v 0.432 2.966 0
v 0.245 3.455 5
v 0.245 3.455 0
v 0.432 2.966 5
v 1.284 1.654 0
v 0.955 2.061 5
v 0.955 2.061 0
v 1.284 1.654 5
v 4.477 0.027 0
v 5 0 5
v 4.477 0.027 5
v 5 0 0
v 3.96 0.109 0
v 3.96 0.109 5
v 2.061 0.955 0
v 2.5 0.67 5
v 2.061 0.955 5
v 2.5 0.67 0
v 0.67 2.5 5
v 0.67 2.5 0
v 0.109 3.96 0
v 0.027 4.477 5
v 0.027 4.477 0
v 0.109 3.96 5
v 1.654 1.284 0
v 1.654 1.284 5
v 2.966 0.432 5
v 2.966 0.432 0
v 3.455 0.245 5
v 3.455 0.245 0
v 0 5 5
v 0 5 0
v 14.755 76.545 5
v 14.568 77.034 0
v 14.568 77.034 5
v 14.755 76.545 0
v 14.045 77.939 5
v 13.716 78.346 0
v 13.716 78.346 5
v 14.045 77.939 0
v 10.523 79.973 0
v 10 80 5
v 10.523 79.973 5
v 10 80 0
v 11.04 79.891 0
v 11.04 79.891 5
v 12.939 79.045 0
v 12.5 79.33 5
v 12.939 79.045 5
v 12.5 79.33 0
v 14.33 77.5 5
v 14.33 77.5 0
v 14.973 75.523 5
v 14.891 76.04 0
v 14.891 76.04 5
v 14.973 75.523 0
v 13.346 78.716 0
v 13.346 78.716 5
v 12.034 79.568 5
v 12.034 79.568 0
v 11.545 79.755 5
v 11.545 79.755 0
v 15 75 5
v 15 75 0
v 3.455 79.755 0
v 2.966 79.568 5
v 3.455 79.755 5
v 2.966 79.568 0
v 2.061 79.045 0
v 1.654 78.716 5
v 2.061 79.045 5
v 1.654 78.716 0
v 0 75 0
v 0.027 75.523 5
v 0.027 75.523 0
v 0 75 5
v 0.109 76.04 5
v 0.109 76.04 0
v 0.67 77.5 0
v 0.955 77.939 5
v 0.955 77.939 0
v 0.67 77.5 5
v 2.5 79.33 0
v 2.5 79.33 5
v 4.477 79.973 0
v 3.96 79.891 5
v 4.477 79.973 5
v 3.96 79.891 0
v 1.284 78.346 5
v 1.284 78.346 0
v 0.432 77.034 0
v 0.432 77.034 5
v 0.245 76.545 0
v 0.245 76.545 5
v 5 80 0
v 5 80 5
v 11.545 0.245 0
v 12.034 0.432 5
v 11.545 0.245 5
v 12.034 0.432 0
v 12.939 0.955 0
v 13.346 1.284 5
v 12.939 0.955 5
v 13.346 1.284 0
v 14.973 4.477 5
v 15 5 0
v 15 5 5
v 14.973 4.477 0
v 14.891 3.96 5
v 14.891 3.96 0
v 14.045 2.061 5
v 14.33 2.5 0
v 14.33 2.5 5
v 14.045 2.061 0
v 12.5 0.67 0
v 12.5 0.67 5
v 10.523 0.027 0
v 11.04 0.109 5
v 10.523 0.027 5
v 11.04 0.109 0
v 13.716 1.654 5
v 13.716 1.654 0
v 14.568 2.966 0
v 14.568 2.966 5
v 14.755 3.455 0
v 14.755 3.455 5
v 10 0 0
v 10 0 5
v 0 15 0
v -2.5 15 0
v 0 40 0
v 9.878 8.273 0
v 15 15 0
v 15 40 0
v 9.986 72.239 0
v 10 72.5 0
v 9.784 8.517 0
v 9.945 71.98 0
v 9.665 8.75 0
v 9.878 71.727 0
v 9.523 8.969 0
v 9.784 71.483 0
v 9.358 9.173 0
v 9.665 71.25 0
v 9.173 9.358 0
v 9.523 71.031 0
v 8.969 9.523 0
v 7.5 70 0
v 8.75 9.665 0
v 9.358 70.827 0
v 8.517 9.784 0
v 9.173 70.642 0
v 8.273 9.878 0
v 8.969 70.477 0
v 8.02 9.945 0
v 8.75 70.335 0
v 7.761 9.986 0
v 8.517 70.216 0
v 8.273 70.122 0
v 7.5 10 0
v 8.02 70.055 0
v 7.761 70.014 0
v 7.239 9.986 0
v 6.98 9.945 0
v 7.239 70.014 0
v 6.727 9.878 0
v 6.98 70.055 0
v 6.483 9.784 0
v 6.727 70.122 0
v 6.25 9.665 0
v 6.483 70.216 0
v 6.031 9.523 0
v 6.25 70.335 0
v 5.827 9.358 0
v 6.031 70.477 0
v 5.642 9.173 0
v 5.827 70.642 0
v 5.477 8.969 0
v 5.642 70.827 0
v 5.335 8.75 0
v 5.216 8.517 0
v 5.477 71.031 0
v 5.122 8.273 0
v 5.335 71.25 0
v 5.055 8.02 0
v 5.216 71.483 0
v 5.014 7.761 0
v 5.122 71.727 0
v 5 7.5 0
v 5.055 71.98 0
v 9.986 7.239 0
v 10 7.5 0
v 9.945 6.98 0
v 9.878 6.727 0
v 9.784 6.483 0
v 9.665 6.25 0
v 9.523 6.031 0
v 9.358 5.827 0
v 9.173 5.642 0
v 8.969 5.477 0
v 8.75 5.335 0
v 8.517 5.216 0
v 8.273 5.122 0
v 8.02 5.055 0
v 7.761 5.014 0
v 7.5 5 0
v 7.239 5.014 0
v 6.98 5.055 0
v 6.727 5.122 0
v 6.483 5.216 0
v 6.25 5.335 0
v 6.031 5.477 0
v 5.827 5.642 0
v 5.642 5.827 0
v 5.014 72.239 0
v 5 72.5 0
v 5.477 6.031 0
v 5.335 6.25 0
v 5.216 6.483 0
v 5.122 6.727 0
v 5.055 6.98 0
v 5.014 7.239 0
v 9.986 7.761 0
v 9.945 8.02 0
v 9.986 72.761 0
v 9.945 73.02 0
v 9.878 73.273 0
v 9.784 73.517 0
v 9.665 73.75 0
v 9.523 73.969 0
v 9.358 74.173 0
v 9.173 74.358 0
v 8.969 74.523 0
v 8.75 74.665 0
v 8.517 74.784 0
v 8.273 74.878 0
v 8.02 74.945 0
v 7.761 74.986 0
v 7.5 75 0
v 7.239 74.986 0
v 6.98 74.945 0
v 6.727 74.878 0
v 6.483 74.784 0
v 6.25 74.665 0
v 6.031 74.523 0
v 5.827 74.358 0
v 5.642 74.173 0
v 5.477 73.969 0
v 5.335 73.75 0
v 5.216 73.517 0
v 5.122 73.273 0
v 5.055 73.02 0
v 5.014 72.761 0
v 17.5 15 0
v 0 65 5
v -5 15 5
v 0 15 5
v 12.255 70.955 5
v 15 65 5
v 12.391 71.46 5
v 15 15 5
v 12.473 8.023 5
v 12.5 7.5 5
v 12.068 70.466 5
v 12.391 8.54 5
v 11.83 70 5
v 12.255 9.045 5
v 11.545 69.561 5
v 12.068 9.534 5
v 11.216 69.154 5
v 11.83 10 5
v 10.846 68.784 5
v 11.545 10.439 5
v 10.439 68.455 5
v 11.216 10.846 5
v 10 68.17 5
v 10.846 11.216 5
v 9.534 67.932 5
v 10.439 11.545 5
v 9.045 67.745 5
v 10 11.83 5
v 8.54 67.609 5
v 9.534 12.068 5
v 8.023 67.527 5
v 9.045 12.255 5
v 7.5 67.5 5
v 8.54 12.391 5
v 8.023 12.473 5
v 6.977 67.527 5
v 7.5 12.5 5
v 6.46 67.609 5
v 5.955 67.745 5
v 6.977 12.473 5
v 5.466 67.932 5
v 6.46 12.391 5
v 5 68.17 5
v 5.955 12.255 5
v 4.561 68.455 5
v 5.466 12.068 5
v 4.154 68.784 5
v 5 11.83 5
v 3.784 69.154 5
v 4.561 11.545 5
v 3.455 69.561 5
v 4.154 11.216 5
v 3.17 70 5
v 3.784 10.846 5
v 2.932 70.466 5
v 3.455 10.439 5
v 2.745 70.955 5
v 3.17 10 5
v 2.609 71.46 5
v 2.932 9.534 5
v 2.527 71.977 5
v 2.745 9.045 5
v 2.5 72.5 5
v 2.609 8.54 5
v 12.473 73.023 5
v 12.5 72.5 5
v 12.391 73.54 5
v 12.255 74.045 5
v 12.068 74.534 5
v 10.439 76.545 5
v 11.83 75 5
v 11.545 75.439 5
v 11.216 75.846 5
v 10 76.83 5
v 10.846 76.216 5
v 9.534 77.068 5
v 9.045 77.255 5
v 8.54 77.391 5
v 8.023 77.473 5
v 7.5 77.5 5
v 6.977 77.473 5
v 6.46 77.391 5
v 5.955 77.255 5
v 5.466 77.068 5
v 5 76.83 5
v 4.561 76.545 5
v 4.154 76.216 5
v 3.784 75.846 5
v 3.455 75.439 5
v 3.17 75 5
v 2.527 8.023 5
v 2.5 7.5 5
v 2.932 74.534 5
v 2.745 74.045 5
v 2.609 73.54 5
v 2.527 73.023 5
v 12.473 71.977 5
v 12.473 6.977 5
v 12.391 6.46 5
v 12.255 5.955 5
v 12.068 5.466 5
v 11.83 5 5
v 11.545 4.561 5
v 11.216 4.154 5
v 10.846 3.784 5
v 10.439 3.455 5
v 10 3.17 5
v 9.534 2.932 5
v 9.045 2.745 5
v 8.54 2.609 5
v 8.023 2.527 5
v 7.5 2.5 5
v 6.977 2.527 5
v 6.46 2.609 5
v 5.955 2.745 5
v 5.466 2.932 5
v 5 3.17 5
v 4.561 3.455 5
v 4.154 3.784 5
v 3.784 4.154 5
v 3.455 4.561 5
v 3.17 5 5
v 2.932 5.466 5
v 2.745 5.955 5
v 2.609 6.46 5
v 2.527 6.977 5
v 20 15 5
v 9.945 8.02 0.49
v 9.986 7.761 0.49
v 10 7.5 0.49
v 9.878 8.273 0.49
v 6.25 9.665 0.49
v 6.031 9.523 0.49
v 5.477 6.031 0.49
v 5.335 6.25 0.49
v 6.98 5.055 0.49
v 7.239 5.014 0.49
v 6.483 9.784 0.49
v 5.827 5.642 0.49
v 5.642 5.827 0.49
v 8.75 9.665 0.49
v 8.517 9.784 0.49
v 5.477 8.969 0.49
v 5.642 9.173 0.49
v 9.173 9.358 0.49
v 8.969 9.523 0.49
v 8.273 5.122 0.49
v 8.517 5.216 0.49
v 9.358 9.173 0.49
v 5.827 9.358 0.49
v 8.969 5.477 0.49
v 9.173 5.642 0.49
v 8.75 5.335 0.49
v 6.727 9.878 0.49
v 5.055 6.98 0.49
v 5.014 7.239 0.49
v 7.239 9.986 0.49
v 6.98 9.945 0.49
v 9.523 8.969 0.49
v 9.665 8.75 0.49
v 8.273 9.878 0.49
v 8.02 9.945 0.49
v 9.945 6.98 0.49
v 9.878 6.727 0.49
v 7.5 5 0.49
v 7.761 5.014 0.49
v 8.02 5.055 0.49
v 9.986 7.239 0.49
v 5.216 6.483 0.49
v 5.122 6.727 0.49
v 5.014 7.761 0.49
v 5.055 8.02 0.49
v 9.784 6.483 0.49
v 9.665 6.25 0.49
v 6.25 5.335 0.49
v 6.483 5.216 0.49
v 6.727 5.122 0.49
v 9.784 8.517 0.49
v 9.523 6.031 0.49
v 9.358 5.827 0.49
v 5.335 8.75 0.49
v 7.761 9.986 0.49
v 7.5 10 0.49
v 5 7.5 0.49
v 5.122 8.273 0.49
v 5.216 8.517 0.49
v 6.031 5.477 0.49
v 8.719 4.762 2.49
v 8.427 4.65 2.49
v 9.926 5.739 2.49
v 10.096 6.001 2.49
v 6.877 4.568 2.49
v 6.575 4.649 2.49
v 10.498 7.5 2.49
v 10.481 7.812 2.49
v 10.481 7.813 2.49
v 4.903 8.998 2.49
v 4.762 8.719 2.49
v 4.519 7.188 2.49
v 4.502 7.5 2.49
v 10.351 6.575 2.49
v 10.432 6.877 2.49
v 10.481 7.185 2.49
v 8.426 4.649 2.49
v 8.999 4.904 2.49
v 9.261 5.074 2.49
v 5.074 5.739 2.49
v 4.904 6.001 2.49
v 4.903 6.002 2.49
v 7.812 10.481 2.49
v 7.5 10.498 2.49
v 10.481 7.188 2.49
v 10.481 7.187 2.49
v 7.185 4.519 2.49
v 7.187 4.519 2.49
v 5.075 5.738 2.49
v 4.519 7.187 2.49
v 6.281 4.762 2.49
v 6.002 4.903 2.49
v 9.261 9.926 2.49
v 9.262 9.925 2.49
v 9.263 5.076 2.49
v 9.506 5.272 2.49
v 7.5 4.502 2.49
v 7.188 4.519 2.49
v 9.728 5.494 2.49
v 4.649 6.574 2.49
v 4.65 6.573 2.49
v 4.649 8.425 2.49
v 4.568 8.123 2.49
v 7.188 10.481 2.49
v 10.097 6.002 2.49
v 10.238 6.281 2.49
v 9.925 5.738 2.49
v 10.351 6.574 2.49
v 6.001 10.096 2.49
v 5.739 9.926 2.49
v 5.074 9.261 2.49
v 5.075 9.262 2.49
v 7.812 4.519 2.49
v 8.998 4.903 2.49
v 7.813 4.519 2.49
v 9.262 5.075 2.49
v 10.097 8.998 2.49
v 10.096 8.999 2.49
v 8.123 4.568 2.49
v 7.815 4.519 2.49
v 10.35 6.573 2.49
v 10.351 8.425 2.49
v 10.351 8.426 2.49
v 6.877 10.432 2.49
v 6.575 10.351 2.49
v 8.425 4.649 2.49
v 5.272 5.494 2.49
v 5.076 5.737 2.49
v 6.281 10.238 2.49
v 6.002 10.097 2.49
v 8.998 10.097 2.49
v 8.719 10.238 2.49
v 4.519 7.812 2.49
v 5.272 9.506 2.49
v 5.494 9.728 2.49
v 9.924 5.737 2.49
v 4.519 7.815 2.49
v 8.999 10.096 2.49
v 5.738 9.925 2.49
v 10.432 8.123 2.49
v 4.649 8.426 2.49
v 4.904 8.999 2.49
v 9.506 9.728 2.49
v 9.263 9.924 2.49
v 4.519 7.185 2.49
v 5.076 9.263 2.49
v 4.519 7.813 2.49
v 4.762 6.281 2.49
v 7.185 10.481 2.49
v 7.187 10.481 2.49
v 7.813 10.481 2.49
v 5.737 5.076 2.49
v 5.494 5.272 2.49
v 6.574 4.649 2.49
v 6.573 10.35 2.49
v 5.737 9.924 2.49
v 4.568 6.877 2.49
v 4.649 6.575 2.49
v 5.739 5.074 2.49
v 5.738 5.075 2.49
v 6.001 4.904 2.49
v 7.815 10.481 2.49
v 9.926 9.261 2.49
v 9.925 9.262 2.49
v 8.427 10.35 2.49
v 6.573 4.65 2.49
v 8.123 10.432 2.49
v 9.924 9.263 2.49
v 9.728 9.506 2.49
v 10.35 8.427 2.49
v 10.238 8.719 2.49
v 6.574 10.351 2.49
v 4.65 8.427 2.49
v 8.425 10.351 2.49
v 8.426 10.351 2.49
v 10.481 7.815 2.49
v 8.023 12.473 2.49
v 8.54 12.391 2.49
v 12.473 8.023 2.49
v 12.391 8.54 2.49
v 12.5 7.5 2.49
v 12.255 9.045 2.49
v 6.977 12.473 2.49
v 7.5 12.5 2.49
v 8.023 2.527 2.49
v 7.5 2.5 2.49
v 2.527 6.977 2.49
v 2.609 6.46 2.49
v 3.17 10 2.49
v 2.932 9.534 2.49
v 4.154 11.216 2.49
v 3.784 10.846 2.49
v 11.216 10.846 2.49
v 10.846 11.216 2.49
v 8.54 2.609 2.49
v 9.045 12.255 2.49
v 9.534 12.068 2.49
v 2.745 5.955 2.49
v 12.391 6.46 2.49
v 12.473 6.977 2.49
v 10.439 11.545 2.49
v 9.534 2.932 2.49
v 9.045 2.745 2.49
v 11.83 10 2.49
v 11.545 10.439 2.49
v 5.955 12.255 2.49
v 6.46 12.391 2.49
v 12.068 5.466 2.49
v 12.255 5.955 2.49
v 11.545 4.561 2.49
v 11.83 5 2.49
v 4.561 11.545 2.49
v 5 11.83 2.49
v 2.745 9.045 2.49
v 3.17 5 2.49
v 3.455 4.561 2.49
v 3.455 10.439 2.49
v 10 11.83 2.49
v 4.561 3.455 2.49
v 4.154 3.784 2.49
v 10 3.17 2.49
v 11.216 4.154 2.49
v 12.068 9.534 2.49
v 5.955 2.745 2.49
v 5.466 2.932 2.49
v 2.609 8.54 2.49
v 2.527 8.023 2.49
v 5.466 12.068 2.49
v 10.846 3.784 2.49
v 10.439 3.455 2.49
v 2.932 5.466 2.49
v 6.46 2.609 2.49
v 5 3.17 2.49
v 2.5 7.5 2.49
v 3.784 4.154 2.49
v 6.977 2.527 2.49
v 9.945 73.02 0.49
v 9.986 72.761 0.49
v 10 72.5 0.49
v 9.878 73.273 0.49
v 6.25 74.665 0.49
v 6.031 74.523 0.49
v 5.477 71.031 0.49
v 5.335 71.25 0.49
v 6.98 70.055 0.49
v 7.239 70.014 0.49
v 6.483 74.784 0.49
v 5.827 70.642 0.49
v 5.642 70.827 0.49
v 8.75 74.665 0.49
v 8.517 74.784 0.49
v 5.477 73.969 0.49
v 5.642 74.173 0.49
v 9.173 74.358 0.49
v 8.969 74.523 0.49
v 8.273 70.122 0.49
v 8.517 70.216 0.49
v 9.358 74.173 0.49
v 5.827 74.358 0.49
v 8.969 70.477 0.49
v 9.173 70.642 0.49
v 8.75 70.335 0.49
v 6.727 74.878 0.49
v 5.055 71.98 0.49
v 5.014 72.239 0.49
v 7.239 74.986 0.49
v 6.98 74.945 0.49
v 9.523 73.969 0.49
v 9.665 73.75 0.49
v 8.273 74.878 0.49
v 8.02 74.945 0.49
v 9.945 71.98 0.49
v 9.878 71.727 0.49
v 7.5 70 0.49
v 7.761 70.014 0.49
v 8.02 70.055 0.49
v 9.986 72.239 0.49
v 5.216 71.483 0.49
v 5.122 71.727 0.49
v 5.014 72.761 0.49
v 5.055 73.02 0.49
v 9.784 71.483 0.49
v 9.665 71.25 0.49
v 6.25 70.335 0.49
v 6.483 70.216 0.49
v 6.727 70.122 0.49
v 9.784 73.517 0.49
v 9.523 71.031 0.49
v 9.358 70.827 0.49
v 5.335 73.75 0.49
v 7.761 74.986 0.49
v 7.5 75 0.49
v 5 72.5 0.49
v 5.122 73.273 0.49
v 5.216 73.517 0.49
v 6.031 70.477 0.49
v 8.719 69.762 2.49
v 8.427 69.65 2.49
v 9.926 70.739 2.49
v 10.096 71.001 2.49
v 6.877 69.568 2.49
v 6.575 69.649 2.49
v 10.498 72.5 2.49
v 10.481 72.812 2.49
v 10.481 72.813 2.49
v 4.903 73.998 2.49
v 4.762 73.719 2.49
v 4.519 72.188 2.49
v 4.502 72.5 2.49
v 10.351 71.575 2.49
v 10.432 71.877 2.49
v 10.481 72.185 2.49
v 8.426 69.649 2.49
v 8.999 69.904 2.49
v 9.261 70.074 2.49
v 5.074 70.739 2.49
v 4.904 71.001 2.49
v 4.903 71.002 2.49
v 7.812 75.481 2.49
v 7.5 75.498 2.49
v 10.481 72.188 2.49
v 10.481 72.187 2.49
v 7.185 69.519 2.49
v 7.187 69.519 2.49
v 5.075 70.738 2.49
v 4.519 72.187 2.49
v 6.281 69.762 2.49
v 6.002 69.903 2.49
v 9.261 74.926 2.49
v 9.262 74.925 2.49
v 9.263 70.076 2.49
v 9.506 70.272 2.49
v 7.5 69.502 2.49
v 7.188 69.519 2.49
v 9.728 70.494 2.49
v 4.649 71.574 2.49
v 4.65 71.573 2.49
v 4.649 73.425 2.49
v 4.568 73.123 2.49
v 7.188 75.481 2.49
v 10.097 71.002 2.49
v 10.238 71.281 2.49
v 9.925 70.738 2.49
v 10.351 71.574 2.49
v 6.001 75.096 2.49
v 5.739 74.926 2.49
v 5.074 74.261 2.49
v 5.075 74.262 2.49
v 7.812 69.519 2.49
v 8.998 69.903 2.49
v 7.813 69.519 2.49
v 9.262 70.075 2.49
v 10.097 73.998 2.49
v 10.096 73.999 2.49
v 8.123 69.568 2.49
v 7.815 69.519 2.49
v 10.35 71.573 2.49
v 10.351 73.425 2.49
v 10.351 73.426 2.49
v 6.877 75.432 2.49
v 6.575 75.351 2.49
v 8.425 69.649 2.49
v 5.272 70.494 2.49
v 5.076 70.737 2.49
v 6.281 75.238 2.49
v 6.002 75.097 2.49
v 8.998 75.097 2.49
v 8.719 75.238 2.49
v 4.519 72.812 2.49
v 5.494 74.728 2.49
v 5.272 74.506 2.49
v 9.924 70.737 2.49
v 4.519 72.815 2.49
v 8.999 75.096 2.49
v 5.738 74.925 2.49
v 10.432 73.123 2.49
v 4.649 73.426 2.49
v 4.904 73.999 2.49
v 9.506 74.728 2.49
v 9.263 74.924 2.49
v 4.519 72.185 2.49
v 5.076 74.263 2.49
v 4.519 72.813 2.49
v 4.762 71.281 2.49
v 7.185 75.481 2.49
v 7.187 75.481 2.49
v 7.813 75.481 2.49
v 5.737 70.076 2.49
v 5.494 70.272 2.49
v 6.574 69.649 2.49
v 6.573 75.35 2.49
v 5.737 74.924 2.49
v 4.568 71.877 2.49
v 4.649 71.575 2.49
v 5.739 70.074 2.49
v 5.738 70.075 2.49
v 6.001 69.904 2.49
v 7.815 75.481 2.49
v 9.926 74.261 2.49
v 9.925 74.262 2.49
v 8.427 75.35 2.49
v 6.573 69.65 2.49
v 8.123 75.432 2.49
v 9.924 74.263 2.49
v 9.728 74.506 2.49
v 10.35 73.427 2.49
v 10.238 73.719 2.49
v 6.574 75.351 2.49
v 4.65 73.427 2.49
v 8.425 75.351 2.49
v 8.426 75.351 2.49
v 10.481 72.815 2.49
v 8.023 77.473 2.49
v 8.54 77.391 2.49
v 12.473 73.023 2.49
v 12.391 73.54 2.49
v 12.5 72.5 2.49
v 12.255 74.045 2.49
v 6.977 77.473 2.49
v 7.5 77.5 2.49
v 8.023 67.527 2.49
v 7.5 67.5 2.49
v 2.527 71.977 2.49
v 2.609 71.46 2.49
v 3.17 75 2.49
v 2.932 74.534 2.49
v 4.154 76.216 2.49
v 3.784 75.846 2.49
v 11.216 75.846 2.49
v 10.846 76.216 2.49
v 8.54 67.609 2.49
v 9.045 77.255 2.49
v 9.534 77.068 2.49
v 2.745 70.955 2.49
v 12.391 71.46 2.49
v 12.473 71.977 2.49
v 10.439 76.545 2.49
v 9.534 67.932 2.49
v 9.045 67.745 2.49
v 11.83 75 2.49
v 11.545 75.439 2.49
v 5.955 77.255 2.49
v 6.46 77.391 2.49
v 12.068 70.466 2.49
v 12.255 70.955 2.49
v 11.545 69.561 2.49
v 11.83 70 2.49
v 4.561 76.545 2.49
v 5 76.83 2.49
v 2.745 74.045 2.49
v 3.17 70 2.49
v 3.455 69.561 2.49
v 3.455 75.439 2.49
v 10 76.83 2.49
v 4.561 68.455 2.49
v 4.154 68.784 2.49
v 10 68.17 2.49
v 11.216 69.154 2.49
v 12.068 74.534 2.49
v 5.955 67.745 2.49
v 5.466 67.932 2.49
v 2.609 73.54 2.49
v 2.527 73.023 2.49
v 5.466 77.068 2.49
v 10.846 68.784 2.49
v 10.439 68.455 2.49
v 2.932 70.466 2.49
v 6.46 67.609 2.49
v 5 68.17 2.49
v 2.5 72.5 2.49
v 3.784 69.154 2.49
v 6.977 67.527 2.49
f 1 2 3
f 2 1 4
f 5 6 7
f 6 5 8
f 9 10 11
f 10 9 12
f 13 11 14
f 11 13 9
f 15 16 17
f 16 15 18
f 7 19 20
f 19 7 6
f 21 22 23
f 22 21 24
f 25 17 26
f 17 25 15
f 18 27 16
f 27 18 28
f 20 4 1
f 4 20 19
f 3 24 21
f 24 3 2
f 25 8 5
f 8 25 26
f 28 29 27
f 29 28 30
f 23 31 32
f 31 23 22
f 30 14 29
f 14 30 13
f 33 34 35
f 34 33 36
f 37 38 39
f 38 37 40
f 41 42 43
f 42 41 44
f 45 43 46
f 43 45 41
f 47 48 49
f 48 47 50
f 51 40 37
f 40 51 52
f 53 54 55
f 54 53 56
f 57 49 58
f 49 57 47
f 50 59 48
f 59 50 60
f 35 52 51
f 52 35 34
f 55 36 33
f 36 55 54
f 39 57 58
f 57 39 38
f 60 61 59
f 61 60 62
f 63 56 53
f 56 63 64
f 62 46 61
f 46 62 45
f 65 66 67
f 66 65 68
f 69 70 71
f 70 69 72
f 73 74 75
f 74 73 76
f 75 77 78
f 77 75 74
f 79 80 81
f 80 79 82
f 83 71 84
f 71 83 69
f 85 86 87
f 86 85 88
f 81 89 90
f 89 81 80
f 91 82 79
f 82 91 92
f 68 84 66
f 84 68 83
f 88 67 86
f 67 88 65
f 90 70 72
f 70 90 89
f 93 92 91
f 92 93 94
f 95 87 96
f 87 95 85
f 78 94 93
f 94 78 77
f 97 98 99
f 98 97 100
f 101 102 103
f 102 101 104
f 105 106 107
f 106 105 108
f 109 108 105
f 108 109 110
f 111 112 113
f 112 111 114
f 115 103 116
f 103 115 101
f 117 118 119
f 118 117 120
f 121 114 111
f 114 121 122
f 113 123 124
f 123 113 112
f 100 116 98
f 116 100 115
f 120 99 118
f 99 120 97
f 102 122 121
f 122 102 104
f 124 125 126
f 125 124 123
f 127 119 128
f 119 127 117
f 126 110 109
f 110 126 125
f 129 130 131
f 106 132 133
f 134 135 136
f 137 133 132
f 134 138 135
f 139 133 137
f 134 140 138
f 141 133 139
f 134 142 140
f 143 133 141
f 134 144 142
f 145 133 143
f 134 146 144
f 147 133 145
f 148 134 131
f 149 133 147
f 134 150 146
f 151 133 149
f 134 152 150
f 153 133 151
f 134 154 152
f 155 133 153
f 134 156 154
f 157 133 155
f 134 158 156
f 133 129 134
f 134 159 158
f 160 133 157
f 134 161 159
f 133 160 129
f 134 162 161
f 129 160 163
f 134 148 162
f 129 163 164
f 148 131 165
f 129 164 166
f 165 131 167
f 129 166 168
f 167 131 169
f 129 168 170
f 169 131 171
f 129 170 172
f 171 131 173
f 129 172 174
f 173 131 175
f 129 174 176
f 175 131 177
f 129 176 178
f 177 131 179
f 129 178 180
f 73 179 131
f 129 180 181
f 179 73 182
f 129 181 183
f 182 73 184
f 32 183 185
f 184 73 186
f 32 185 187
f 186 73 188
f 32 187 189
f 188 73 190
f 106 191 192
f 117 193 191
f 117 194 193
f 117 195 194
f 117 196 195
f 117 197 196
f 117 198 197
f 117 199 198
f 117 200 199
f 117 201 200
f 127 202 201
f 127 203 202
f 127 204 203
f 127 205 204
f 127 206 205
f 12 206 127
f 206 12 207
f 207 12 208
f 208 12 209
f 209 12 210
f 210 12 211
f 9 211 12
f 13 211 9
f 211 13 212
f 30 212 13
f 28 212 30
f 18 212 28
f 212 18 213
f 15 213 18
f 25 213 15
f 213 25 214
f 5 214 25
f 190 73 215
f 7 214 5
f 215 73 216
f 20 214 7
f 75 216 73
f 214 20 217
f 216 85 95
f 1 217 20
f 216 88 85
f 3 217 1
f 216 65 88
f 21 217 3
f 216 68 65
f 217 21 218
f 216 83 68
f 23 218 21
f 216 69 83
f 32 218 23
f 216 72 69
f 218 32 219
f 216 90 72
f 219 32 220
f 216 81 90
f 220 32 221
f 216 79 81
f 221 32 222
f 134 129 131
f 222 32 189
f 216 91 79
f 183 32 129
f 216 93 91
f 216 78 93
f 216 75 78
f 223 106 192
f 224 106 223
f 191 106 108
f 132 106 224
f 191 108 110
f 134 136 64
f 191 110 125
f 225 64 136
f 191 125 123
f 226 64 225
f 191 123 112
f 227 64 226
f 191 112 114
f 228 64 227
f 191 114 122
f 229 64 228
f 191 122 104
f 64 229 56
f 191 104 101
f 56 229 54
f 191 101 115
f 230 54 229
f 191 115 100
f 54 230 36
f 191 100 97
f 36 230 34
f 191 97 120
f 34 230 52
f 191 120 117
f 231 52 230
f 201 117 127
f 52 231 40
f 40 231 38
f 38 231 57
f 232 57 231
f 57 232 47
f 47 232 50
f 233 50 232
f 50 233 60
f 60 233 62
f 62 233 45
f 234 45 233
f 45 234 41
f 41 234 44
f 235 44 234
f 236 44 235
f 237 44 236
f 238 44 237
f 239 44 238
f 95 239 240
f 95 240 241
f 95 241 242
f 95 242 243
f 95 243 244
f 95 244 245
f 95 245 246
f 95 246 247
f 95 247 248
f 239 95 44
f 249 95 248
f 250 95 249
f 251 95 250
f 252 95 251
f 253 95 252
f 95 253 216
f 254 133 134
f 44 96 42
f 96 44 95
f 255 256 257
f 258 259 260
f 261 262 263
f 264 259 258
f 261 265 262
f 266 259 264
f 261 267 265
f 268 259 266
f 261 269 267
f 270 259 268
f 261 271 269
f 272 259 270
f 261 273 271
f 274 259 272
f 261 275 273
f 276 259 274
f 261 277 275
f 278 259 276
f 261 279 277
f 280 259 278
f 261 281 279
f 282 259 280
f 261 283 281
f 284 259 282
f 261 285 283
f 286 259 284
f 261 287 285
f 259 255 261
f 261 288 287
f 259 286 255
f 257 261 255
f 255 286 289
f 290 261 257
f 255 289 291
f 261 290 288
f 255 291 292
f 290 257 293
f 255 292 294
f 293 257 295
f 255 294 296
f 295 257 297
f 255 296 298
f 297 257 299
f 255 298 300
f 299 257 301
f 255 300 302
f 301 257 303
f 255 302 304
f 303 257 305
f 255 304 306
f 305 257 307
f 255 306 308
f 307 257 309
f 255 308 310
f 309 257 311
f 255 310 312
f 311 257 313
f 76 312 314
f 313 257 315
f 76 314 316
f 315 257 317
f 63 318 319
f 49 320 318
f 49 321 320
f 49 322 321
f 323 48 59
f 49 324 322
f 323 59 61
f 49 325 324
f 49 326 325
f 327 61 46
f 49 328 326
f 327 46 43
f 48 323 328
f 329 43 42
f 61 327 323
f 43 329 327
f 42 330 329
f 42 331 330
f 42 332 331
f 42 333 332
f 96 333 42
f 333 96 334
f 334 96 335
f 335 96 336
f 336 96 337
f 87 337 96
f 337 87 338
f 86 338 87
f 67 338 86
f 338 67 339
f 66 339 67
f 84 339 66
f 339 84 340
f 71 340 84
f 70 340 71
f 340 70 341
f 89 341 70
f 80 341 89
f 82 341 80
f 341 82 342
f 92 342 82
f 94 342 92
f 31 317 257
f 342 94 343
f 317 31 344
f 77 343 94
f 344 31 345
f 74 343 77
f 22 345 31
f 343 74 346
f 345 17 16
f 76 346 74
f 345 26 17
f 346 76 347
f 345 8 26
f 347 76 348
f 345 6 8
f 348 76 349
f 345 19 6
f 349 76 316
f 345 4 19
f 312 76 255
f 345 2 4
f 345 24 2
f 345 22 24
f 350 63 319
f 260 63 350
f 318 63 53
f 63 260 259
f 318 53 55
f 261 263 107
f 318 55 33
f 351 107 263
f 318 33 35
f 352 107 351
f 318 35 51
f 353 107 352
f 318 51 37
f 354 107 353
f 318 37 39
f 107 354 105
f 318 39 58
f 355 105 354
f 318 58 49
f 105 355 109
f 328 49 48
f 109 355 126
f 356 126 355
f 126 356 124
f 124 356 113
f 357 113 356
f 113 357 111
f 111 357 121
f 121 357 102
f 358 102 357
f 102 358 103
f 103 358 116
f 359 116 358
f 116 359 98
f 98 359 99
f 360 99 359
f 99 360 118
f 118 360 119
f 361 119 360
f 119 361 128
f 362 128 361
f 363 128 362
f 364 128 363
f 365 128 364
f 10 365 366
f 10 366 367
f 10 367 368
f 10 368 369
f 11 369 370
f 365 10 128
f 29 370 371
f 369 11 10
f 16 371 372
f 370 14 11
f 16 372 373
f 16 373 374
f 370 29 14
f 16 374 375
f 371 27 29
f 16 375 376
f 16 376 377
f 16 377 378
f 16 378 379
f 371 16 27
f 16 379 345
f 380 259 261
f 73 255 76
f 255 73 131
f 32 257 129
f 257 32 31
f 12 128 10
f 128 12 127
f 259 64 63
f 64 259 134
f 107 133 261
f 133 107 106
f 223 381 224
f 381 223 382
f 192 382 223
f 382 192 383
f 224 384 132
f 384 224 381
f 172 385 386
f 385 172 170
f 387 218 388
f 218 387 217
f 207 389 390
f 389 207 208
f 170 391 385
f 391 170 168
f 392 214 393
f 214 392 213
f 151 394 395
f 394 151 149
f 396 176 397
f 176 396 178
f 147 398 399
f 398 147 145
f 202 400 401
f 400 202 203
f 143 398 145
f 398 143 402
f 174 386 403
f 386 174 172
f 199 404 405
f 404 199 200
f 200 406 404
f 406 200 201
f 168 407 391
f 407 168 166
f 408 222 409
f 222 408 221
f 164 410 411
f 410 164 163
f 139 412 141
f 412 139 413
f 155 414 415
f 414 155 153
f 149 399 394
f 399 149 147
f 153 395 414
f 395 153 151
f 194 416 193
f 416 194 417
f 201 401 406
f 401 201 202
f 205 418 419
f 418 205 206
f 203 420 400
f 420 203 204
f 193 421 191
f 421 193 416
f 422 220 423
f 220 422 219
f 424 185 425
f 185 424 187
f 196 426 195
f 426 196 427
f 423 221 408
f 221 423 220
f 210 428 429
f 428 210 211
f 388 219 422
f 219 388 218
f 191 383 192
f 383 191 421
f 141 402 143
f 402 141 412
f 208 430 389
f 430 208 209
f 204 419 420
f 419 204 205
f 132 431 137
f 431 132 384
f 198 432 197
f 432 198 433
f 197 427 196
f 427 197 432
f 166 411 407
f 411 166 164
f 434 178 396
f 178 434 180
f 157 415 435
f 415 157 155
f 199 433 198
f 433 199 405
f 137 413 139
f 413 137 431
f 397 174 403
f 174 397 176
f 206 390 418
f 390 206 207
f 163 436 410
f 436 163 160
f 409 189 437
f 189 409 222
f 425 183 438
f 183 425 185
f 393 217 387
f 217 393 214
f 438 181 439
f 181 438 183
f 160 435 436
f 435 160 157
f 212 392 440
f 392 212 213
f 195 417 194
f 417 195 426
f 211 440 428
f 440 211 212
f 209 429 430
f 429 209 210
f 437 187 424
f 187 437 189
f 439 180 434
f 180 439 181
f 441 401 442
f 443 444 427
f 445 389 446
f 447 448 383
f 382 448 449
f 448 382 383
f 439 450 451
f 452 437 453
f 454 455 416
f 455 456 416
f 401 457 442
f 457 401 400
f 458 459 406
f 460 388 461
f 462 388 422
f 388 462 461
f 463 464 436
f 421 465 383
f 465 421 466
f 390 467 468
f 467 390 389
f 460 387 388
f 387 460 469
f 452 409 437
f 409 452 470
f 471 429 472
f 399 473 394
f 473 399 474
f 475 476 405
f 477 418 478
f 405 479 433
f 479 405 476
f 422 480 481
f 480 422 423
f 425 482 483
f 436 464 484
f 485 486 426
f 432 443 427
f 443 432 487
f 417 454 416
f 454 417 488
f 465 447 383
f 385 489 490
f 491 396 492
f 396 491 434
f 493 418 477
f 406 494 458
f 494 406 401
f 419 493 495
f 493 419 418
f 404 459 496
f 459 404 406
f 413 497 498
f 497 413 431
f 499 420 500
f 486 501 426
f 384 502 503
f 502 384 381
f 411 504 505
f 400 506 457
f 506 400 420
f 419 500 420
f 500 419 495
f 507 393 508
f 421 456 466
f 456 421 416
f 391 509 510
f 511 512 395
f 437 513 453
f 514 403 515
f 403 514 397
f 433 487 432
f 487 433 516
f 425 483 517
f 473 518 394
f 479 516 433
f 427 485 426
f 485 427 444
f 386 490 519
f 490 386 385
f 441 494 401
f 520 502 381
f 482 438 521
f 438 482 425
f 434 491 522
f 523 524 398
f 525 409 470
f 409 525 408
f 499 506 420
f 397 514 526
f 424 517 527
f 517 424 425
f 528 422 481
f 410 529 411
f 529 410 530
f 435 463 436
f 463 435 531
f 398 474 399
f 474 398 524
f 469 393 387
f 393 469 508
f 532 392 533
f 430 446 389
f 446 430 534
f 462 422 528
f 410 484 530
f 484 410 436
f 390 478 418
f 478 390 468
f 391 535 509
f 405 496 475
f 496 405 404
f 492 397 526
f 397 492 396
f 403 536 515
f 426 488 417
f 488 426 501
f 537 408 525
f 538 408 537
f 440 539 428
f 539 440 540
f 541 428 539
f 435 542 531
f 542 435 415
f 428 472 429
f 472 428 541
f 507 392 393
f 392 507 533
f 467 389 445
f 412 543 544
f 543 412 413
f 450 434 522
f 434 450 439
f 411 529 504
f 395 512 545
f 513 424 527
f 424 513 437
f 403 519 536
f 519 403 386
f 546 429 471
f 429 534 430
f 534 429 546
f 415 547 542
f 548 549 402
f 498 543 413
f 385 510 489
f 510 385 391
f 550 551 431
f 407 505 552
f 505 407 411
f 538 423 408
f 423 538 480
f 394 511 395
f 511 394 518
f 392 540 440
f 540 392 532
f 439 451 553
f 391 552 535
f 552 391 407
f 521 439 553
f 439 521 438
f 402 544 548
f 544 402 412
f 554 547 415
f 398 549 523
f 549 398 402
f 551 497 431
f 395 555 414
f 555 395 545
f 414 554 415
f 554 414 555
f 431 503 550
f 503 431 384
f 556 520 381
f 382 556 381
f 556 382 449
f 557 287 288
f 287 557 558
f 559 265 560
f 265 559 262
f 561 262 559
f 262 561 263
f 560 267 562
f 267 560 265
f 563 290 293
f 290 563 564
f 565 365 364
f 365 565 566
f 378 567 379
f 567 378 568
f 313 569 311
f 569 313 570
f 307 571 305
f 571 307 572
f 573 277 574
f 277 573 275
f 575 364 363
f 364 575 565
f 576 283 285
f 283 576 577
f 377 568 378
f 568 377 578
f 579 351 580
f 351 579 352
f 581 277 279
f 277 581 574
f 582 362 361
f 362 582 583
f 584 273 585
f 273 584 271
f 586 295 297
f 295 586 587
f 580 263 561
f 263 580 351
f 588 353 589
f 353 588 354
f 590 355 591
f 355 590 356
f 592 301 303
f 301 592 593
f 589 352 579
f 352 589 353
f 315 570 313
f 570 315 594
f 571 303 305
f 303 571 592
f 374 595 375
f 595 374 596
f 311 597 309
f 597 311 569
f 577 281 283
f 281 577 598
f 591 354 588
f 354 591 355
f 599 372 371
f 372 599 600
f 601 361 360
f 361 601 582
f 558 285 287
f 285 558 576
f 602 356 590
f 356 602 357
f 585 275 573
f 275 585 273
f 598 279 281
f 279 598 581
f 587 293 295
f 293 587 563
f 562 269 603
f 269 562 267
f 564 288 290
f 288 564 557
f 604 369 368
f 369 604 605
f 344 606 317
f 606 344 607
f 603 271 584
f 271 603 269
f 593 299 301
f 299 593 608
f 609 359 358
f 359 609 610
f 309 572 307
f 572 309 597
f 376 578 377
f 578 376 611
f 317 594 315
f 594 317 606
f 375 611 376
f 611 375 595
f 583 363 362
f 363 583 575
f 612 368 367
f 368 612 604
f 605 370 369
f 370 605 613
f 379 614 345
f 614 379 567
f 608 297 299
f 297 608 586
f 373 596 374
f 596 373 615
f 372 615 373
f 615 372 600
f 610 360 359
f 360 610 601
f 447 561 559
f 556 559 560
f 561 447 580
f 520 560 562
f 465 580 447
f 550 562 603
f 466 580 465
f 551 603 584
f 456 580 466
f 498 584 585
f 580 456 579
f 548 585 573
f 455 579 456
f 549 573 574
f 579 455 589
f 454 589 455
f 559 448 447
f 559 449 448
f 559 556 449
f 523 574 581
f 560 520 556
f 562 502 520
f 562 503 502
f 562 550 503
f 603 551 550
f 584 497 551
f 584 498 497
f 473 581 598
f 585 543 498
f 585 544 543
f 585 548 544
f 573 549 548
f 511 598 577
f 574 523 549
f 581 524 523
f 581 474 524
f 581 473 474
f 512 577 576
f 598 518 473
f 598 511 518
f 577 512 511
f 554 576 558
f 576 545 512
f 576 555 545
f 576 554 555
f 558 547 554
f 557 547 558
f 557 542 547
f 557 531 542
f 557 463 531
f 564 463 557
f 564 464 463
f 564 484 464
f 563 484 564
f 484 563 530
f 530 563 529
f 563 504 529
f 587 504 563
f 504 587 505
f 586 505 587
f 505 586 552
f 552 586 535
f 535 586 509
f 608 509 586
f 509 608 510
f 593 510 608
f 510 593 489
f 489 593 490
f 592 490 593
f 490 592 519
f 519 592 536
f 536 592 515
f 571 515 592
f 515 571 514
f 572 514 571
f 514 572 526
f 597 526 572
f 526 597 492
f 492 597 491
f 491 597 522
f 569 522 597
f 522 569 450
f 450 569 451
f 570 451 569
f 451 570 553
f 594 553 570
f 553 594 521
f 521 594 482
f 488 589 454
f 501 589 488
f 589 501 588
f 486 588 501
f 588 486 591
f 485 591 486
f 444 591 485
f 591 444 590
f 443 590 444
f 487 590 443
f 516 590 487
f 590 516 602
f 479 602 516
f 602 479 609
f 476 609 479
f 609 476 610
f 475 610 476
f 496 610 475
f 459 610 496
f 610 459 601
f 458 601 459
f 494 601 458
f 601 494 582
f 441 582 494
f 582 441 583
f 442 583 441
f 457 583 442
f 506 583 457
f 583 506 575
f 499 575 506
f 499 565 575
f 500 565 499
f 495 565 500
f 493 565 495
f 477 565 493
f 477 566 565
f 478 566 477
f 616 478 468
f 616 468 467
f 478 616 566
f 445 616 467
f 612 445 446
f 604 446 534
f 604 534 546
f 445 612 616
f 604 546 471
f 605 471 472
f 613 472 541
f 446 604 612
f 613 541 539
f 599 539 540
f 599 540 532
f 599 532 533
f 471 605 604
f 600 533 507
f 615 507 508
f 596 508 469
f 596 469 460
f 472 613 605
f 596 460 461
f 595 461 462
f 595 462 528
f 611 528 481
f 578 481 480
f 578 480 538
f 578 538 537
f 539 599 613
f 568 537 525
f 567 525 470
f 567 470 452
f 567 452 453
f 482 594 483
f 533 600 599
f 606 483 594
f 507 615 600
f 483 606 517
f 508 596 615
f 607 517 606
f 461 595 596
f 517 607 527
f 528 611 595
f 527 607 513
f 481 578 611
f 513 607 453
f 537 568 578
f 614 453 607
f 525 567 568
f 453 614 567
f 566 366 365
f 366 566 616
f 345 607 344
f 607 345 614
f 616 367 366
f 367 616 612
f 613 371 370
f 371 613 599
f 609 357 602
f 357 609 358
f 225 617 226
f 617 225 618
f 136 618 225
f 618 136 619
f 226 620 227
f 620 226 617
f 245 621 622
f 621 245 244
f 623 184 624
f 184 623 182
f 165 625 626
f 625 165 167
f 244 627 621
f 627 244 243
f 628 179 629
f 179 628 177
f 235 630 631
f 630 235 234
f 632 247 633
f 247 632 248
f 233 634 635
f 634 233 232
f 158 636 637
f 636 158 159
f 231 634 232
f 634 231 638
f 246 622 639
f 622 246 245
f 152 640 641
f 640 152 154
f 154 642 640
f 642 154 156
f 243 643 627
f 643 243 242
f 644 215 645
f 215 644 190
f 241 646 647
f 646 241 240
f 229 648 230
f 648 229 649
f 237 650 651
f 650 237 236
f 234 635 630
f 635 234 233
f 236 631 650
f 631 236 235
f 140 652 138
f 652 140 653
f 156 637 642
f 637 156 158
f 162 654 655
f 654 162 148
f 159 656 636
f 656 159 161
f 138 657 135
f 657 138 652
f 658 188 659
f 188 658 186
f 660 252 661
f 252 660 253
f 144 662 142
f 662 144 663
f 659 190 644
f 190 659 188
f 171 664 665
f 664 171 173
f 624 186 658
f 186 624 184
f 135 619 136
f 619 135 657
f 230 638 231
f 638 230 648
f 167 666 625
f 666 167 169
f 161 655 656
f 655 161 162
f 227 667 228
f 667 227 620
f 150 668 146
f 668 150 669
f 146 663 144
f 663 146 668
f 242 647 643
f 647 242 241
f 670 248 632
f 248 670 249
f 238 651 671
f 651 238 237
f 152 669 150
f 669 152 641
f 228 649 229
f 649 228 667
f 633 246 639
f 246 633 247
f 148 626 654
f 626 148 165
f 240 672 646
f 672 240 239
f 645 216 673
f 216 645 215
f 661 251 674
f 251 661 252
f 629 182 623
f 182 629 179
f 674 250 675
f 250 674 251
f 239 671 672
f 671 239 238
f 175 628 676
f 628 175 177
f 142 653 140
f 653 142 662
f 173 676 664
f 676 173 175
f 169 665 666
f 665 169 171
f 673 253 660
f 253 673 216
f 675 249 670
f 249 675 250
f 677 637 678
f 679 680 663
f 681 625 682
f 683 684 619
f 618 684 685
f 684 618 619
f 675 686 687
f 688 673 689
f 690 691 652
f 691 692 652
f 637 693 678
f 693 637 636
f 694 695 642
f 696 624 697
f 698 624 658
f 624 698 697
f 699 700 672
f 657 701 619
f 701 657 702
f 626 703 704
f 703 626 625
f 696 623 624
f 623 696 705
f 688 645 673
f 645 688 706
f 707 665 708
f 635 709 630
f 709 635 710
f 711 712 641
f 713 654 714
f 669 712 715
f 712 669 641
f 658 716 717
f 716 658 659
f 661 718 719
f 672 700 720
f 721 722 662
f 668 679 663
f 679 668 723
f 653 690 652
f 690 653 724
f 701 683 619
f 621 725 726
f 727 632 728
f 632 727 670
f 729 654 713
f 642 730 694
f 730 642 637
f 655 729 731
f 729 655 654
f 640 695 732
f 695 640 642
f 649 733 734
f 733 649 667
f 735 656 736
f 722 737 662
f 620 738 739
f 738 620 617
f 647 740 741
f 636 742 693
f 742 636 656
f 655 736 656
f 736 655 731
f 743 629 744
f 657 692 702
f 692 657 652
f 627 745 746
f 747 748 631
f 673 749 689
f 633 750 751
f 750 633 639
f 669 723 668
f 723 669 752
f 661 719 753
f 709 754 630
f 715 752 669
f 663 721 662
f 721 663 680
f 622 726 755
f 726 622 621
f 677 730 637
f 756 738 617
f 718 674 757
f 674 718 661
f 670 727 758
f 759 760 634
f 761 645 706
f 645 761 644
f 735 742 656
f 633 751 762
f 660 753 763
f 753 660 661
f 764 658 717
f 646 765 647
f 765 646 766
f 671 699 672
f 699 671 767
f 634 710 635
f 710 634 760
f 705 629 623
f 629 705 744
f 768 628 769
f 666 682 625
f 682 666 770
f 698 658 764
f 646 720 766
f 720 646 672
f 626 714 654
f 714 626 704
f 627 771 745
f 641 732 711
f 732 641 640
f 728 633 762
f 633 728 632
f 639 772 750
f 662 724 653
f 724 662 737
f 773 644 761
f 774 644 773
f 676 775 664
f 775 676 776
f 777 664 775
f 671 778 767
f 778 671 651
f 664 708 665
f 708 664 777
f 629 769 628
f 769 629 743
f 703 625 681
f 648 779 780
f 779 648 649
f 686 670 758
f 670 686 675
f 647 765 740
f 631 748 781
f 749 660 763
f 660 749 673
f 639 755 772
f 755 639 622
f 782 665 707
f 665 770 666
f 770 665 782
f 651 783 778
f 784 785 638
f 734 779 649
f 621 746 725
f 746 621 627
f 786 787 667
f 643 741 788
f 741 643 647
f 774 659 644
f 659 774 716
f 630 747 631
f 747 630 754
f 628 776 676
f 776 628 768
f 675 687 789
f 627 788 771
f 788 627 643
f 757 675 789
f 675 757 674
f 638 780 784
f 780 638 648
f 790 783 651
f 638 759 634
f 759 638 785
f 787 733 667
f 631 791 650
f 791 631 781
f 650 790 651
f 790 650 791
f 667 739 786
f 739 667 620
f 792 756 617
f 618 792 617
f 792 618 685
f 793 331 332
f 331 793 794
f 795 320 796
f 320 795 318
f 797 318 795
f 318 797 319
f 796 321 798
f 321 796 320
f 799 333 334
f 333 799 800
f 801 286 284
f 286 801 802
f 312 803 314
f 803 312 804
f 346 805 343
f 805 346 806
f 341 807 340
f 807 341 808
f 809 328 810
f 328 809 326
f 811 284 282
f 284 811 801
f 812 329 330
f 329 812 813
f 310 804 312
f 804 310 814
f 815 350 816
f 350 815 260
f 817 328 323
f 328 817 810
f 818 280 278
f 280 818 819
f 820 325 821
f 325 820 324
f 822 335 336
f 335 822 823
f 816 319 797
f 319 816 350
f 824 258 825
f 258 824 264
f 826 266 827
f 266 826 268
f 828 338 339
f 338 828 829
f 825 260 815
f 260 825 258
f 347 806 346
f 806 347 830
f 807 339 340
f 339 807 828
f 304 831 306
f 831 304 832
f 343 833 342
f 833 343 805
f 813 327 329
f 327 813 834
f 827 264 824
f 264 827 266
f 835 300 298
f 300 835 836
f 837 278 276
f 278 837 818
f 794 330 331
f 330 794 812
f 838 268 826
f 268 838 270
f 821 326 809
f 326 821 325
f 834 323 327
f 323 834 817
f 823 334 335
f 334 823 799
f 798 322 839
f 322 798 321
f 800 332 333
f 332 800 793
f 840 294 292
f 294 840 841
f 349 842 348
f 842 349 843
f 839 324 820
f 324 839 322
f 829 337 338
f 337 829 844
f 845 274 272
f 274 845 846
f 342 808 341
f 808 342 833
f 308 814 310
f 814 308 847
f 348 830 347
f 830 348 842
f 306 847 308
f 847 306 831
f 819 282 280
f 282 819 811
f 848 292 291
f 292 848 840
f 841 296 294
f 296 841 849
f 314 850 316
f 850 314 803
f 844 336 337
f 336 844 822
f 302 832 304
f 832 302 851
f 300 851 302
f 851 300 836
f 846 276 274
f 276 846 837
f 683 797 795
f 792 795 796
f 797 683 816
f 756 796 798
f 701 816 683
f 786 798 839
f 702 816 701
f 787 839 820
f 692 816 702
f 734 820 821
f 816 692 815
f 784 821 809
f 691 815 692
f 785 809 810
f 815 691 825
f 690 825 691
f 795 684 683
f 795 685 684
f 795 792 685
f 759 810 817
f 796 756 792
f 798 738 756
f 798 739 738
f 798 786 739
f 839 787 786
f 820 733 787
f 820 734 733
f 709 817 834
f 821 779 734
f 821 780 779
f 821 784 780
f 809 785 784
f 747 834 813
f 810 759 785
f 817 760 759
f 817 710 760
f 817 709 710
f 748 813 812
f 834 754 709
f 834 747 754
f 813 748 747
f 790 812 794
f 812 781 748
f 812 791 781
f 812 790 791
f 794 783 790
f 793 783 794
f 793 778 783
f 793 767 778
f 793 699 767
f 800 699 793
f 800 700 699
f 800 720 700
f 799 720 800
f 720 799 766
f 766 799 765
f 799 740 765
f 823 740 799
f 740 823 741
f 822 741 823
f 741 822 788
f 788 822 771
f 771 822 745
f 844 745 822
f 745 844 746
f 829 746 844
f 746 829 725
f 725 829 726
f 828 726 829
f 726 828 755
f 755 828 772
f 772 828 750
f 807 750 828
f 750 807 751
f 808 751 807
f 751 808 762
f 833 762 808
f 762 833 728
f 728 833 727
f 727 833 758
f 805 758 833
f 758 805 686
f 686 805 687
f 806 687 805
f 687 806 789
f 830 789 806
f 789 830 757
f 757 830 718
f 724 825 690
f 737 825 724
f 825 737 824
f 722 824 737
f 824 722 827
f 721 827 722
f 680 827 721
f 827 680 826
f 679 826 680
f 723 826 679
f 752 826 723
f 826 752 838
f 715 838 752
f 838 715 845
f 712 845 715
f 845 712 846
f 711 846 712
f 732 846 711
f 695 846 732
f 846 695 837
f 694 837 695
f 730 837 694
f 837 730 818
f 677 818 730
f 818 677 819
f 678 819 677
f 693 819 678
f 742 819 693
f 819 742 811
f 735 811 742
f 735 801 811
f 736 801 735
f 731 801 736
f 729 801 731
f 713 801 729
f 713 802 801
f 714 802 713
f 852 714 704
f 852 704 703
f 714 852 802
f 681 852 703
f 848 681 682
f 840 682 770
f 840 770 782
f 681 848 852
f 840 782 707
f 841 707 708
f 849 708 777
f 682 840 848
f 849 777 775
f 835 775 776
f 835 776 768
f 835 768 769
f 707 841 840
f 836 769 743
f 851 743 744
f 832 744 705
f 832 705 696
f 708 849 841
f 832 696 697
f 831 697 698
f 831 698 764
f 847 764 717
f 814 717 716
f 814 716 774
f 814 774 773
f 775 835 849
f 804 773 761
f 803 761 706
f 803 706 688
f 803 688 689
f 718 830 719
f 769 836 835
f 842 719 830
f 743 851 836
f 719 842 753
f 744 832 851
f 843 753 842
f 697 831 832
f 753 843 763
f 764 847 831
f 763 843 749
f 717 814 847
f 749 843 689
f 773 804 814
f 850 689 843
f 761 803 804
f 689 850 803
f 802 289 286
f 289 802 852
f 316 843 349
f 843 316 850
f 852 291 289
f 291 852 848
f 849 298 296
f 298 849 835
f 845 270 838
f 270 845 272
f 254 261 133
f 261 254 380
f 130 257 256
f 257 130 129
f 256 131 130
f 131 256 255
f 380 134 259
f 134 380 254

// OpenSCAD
// file: parts/box.scad
module box(w, l, h){
    polyhedron(
        points=[
            // lowest layer
            [0, 0, 0],
            [0, w, 0],
            [l, w, 0],
            [l, 0, 0],

            // top layer
            [0, 0, h],
            [0, w, h],
            [l, w, h],
            [l, 0, h]
        ],
        faces=[
            // bottom
            [0, 3, 2, 1],

            // sides beginning with front
            [0, 1, 5, 4],
            [1, 2, 6, 5],
            [3, 7, 6, 2],
            [0, 4, 7, 3],

            // top
            [4, 5, 6, 7]
        ]
    );
}

box(30, 50, 5);
// file: parts/slide.scad
module slide(l, h, w1, w2){
    translate([-w1/2, -l/2, -h/2])
    polyhedron(
        points=[
            // lowest layer
            [0, 0, 0],
            [w1, 0, 0],
            [w2-((w2-w1)/2), l, 0],
            [-((w2-w1)/2), l, 0],

            // top layer
            [h/2, 0, h],
            [w1-h/2, 0, h],
            [w2-((w2-w1)/2)-h/2, l, h],
            [-((w2-w1)/2)+h/2, l, h],
            [0, h/2, h],
            [0, w1-h/2, h],
            [l, w2-((w2-w1)/2), h],
            [l, -((w2-w1)/2)+h/2, h]
        ],
        faces=[
            // bottom
            [0, 3, 2, 1],

            // sides beginning with front
            [0, 1, 5, 4],
            [1, 2, 6, 5],
            [3, 7, 6, 2],
            [0, 4, 7, 3],

            // top
            [4, 5, 6, 7]
        ]
    );
}

slide(60, 5, 20, 24);
// file: parts/box_rounded.scad
use <box.scad>;

module box_rounded(w, l, h, r) {
    difference() {
        box(w, l, h);

        translate([l, w, 0]) rotate([0, 0, 180]) difference() {
            translate([0, 0, h / 2]) cube([2*r, 2*r, 2*h], center = true);
            translate([r, r, h / 2]) cylinder(h = 3*h, r = r, center = true, $fn=60);
        }

        translate([0, w, 0]) rotate([0, 0, 270]) difference() {
            translate([0, 0, h / 2]) cube([2*r, 2*r, 2*h], center = true);
            translate([r, r, h / 2]) cylinder(h = 3*h, r = r, center = true, $fn=60);
        }

        translate([l, 0, 0]) rotate([0, 0, 90]) difference() {
            translate([0, 0, h / 2]) cube([2*r, 2*r, 2*h], center = true);
            translate([r, r, h / 2]) cylinder(h = 3*h, r = r, center = true, $fn=60);
        }

        difference() {
            translate([0, 0, h / 2]) cube([2*r, 2*r, 2*h], center = true);
            translate([r, r, h / 2]) cylinder(h = 3*h, r = r, center = true, $fn=60);
        }
    }
}

box_rounded(30, 50, 5, 5);
// file: parts/screw_hole.scad
module screw_hole(r1, h1, r2, h2, r3, h3){
    d = 0.01;

    union() {
        cylinder(h=h1, r=r1, $fn=60);
        translate([0, 0, h1-d]) cylinder(h=h2+d, r1=r1, r2=r2, $fn=60);
        translate([0, 0, h1+h2-d]) cylinder(h=h3+d, r=r3, $fn=60);
    }
}

screw_hole(r1=10, h1=10, r2=20, h2=10, r3=30, h3=10);
// main file
use <parts/screw_hole.scad>;
use <parts/box_rounded.scad>;
use <parts/slide.scad>;

width = 15;
depth = 80;
distance = 65;
height = 5;

union() {
    difference() {
        box_rounded(depth, width, height, 5);

        translate([width/2, (depth-distance)/2, -1])
            screw_hole(r1=2.5, h1=1.5, r2=3, h2=2, r3=5, h3=3.5);
        translate([width/2, depth-(depth-distance)/2, -1])
            screw_hole(r1=2.5, h1=1.5, r2=3, h2=2, r3=5, h3=3.5);
    }

    translate([width/2, depth/2, 2.5])
        rotate([0, 180, 0])
        slide(l = 50, h = 5, w1 = width+10, w2 = width);
}
